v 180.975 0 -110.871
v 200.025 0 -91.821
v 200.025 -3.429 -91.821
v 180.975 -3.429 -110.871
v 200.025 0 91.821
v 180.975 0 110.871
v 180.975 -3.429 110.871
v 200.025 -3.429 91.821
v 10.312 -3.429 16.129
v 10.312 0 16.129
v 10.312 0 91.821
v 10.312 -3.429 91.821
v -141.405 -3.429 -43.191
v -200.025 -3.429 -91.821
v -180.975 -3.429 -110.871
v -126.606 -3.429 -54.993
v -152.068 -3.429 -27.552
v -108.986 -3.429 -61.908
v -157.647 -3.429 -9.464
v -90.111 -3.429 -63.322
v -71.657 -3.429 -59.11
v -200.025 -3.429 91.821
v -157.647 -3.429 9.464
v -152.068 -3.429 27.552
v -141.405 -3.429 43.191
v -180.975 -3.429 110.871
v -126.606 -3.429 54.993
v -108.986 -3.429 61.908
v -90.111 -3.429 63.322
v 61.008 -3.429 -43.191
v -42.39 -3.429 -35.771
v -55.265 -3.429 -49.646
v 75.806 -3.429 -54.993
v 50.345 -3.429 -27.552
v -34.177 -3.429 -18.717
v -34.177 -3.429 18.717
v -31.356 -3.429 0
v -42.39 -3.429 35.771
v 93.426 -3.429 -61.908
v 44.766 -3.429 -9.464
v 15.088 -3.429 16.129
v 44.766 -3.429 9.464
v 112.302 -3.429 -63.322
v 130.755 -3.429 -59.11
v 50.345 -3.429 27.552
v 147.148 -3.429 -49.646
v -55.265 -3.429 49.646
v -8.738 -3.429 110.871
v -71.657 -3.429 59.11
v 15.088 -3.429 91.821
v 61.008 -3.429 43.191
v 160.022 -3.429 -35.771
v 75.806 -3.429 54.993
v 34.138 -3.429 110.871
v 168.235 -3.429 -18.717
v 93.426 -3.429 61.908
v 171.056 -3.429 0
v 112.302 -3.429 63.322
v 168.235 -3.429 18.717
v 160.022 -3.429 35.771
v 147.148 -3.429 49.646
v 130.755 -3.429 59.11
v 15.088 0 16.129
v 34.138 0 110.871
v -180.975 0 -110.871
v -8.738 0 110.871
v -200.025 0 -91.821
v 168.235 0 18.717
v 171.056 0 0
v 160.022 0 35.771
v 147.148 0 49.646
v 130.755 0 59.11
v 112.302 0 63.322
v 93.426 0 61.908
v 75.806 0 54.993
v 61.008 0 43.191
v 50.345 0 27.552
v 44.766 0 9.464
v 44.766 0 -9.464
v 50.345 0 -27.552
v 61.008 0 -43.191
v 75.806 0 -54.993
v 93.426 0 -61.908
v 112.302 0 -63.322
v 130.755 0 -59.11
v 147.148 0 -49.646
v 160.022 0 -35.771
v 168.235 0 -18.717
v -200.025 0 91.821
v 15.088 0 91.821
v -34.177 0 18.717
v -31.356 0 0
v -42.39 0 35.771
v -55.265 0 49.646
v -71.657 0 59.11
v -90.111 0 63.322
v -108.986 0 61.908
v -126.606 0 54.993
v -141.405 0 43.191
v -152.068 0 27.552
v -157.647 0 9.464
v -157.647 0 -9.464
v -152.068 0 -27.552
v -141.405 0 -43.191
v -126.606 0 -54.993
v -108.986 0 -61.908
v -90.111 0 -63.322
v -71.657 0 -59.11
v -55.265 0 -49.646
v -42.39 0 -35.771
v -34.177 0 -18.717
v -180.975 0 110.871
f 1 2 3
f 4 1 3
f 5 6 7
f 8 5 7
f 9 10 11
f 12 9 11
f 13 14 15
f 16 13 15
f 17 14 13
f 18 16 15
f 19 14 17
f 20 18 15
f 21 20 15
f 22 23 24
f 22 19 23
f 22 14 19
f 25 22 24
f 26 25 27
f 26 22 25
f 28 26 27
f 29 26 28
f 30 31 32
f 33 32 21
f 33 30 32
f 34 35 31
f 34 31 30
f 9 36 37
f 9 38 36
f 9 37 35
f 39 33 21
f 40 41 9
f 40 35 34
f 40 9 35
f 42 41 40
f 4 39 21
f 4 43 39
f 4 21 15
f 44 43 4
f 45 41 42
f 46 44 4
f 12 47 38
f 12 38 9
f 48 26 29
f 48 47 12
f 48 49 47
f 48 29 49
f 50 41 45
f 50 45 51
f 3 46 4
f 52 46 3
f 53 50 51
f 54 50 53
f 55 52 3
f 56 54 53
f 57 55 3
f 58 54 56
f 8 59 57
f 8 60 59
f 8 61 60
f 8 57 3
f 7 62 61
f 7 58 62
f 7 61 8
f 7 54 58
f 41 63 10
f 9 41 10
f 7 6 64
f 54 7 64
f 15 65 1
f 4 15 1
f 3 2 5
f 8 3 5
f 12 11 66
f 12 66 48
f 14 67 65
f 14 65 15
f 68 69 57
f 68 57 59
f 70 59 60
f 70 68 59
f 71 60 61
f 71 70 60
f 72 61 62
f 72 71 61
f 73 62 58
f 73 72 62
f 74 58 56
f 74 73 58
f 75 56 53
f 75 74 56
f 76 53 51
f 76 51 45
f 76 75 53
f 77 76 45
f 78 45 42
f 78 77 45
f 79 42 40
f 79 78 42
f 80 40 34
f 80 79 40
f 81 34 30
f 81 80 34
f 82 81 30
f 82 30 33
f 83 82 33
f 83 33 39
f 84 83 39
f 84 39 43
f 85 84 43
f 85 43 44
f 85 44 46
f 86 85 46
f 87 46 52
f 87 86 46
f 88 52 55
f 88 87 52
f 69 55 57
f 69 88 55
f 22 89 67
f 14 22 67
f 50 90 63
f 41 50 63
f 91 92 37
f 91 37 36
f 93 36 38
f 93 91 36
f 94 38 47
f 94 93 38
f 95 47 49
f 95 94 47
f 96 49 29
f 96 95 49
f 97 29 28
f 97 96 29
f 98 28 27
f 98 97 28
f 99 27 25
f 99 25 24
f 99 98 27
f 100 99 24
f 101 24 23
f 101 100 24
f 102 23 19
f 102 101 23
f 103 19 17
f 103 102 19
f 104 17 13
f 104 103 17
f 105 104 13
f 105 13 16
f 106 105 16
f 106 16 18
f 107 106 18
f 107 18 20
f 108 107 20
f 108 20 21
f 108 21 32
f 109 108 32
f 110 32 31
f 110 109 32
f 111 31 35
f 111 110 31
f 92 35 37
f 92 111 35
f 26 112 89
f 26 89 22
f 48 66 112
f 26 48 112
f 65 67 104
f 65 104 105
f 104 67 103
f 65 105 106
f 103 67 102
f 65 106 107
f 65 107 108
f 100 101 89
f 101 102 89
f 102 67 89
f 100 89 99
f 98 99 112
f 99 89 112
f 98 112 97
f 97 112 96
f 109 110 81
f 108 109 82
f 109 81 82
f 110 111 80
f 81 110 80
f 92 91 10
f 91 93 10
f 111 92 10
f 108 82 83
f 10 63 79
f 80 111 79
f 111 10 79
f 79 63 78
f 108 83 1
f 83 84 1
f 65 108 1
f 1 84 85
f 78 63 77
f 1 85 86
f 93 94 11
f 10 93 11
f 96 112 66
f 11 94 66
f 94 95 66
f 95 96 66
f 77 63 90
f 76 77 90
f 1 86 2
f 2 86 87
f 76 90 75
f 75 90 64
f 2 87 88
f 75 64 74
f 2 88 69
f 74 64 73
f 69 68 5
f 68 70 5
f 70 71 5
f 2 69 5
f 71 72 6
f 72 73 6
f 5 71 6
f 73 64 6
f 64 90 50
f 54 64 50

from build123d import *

# Parameters (mm, degrees)
F0_R     = 63.5
F1_DEPTH = 3.429
F2_SIZE  = 19.05


with BuildPart() as f1:
    # F0 (on Front) → F1 (new body)
    with BuildSketch(Plane.XZ):
        Polygon((-200.025, -110.871), (200.025, -110.871), (200.025, 110.871), (15.0876, 110.871), (15.0876, 16.129), (10.3124, 16.129), (10.3124, 110.871), (-200.025, 110.871), align=None)
        with Locations((-94.8563, 0)):
            Circle(F0_R, mode=Mode.SUBTRACT)
        with Locations((107.5563, 0)):
            Circle(F0_R, mode=Mode.SUBTRACT)
    extrude(amount=F1_DEPTH)

    # F2
    f2_edges = [f1.edges().sort_by_distance(p)[0] for p in [
        (-200.025, -1.7145, 110.871),
        (10.3124, -1.7145, 110.871),
        (15.0876, -1.7145, 110.871),
        (200.025, -1.7145, 110.871),
        (200.025, -1.7145, -110.871),
        (-200.025, -1.7145, -110.871),
    ]]
    chamfer(f2_edges, length=F2_SIZE)


solid = f1.part
